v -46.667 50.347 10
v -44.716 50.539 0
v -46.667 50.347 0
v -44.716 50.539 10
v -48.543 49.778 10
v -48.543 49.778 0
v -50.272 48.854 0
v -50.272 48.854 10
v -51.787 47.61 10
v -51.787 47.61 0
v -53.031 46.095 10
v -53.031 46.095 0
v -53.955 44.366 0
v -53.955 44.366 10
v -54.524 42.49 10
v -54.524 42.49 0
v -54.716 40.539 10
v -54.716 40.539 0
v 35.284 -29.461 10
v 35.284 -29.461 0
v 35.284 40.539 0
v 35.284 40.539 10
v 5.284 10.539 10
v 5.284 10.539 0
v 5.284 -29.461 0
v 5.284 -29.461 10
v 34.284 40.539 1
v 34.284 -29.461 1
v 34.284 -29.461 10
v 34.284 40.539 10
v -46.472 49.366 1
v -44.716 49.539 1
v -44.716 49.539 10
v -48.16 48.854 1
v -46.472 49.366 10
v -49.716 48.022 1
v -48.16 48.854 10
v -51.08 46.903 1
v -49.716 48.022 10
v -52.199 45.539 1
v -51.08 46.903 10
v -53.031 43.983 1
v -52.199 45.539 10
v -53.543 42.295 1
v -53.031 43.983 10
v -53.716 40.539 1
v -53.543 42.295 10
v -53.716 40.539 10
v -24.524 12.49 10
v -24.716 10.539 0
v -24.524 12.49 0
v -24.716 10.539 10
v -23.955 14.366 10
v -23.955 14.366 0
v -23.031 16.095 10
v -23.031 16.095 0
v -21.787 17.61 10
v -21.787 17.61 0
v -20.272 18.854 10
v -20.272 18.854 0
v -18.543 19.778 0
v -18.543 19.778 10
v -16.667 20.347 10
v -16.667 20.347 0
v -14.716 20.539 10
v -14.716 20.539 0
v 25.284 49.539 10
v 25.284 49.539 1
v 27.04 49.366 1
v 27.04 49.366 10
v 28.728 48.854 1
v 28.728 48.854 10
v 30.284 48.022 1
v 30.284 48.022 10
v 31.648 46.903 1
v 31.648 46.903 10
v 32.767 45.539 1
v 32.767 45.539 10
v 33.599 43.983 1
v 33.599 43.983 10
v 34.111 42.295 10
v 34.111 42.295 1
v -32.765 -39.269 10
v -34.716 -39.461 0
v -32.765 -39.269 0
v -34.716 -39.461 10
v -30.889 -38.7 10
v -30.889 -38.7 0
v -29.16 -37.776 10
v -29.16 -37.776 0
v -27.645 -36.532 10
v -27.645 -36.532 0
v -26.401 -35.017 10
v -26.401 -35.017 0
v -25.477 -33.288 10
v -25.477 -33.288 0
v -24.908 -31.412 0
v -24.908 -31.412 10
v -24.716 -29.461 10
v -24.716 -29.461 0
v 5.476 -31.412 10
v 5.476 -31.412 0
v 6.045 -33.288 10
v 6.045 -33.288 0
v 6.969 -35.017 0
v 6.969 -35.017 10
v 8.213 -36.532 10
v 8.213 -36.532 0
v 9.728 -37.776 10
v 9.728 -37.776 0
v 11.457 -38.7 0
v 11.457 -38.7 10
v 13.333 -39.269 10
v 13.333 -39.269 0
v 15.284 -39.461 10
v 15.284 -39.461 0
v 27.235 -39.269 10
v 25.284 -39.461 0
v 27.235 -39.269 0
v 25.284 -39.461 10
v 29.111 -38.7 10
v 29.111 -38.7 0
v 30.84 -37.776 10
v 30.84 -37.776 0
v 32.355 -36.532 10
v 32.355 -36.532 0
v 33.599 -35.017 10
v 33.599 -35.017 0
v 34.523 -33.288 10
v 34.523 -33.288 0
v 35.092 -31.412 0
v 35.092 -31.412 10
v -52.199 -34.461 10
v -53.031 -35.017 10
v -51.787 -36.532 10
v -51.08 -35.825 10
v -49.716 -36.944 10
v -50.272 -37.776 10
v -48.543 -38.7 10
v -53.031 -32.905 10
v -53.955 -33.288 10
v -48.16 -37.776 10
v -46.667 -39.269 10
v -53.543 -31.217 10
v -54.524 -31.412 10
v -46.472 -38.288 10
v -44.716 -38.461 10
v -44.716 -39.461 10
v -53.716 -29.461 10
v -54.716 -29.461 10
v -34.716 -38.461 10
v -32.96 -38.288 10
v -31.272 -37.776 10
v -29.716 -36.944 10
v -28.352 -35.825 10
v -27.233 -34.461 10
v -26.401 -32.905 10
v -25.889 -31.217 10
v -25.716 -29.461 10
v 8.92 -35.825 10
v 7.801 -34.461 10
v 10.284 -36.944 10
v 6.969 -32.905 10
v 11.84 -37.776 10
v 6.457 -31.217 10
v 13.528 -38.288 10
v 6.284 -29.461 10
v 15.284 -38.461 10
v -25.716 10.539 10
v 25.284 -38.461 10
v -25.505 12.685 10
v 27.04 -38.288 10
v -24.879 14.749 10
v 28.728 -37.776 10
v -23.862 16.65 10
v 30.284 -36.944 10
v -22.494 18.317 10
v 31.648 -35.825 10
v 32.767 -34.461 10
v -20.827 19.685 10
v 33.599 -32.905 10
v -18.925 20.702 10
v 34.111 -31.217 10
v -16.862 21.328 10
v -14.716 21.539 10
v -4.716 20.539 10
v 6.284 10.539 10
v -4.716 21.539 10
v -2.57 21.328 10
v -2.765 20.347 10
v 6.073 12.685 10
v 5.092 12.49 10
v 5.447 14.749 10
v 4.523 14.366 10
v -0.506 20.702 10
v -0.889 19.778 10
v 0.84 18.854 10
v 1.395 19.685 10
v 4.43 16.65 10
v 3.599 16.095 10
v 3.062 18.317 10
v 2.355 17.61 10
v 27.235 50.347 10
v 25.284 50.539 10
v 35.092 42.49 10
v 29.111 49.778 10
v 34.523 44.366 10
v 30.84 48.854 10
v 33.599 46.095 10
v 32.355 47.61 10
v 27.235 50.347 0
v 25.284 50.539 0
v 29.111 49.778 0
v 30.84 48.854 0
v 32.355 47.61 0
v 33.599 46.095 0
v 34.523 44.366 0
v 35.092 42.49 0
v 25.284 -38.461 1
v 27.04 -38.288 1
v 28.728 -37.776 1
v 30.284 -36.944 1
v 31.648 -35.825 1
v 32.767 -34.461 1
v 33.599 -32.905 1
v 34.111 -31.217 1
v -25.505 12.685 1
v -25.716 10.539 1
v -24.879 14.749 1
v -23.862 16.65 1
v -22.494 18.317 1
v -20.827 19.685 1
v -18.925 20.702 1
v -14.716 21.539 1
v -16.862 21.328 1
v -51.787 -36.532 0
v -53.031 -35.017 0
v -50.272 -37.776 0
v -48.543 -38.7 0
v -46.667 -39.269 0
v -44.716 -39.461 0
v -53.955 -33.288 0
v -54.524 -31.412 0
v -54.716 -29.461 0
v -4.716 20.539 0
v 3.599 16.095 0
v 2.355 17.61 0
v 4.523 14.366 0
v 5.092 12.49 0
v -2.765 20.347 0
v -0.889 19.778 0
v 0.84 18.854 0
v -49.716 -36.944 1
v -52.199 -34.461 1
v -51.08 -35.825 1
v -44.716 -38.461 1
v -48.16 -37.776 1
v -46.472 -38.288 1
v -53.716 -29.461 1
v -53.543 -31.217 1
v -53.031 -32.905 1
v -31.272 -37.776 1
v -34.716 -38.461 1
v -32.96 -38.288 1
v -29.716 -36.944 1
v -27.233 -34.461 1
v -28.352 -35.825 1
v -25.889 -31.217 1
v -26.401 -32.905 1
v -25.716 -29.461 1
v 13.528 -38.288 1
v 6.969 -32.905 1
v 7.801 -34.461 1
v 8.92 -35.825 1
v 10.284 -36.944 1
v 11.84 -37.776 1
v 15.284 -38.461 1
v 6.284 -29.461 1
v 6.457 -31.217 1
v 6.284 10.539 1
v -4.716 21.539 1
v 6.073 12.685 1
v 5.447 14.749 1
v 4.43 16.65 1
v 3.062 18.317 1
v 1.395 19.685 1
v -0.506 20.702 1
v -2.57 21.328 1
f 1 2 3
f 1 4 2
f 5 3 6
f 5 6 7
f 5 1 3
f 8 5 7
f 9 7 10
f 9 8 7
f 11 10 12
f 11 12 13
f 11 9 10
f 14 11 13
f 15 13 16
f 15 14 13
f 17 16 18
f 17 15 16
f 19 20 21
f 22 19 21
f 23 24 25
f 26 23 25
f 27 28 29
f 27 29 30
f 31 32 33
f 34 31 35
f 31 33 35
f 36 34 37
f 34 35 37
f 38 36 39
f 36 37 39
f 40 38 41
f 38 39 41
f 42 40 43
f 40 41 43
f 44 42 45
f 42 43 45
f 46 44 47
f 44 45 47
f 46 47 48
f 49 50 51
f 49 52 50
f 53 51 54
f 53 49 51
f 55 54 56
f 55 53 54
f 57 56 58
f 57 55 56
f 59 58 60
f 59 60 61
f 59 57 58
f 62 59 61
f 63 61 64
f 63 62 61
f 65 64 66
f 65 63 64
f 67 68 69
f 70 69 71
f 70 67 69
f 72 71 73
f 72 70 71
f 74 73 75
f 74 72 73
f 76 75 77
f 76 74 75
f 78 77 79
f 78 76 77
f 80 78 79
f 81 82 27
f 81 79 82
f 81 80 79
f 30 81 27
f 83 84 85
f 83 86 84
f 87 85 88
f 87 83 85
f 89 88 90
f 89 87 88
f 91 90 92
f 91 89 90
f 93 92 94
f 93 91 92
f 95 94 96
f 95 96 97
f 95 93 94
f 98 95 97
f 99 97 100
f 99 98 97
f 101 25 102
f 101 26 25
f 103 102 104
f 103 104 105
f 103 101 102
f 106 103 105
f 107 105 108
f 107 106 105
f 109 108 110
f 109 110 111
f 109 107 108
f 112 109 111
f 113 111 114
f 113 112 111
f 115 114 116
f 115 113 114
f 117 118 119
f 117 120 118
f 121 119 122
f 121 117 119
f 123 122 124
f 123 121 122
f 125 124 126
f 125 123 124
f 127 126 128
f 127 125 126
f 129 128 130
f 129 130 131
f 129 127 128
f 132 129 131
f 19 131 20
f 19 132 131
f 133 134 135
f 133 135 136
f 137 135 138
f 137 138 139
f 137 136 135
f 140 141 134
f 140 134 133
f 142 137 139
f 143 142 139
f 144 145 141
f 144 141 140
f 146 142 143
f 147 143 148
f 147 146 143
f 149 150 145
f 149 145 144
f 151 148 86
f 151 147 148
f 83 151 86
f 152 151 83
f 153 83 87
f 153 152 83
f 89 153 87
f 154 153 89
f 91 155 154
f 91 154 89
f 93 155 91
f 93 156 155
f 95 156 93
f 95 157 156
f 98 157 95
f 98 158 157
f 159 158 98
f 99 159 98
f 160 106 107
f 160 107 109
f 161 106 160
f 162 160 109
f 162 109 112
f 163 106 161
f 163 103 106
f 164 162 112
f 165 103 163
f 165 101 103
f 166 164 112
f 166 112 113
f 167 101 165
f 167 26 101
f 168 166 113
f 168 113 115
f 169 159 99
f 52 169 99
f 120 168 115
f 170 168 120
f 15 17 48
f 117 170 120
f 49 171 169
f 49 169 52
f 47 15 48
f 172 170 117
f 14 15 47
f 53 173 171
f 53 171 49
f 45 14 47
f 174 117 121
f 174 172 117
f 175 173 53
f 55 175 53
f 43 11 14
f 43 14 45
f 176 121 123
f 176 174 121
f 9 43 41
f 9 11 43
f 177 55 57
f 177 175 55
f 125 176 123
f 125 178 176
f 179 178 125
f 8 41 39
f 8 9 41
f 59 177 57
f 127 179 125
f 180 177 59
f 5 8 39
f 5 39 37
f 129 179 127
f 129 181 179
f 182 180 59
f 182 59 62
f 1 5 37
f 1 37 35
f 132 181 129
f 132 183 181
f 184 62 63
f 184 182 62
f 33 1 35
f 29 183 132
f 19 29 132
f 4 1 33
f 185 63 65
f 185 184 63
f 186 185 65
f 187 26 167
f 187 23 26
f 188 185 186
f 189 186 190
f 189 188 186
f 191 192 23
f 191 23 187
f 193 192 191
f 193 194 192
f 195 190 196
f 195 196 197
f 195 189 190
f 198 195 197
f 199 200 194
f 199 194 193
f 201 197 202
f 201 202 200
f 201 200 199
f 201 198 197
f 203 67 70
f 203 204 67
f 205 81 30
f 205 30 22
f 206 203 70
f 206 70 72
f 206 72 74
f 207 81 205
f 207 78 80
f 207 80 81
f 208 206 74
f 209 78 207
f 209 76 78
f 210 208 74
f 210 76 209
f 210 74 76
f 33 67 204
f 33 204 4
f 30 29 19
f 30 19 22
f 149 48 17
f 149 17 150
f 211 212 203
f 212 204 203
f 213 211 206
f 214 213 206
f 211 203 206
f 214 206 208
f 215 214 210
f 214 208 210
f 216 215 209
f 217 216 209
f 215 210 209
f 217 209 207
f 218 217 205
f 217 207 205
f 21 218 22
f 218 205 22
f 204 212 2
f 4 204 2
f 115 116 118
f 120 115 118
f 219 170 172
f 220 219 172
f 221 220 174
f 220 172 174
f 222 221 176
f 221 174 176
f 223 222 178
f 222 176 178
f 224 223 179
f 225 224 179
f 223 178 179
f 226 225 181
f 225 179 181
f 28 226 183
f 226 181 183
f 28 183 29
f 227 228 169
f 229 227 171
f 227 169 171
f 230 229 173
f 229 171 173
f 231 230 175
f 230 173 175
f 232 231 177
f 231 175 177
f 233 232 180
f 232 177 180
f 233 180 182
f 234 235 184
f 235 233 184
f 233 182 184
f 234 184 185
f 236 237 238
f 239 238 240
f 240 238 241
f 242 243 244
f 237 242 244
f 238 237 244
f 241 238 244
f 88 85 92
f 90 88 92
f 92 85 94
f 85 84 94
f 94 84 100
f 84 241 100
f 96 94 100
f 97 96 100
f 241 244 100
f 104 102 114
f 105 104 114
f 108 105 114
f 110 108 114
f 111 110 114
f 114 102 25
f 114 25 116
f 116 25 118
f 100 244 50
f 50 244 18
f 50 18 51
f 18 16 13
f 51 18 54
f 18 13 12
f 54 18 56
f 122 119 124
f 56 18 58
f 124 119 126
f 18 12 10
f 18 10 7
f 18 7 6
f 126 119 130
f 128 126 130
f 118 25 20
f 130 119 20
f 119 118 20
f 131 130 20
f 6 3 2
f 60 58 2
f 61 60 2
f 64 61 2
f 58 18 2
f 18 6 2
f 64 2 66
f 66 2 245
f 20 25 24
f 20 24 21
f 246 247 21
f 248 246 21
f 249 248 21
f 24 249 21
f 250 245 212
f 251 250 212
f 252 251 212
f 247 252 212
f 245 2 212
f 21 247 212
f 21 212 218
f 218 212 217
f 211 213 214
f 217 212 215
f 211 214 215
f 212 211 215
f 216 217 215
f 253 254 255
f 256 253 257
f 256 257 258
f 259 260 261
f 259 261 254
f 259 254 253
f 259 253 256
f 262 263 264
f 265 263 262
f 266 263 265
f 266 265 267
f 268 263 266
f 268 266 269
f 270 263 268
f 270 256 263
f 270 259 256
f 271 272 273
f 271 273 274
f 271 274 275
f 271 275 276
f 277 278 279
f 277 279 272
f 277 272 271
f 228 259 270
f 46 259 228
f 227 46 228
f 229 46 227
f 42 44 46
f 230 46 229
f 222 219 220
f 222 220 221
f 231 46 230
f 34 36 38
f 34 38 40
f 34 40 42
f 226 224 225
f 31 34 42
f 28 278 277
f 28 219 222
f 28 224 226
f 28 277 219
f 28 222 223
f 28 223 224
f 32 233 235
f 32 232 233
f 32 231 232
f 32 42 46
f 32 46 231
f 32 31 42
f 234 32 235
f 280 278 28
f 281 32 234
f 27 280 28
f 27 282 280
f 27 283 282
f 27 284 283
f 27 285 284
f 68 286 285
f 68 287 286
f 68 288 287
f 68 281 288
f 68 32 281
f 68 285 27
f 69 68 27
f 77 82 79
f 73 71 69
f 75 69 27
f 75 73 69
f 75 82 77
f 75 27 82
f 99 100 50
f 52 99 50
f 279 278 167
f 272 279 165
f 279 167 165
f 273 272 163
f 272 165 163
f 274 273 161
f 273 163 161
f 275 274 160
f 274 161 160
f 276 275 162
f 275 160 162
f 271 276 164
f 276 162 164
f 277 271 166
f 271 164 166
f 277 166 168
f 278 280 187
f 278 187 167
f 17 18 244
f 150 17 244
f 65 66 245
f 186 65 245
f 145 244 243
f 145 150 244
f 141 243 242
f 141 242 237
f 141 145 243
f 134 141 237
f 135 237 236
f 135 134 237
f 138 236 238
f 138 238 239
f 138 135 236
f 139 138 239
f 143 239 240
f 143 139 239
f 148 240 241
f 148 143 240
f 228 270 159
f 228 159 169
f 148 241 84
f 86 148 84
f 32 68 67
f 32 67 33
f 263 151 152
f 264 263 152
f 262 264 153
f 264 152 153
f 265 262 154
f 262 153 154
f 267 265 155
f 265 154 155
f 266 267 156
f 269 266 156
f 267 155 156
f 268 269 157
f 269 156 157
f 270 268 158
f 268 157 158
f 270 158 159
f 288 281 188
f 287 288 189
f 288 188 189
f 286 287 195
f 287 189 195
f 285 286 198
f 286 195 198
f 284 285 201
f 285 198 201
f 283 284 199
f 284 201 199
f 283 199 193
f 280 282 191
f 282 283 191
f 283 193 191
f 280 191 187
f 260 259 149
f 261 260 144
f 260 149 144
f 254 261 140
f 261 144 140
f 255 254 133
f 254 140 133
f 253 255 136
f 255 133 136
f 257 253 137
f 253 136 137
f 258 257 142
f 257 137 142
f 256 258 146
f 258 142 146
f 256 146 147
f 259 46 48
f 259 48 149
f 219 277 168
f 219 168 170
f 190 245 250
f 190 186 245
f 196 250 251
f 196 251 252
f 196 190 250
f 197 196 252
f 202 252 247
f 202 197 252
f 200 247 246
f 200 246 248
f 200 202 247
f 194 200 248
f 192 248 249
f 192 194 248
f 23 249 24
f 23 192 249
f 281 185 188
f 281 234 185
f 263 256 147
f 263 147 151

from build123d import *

# Parameters (mm, degrees)
F1_DEPTH = 10
F2_R     = 10
F3_T     = -1


with BuildPart() as f1:
    # F0 (on Top) → F1 (new body)
    with BuildSketch(Plane.XY):
        Polygon((35.284058, 50.538993), (-54.715942, 50.538993), (-54.715942, -39.461007), (-24.715942, -39.461007), (-24.715942, 20.538993), (5.284058, 20.538993), (5.284058, -39.461007), (35.284058, -39.461007), align=None)
    extrude(amount=F1_DEPTH)

    # F2
    f2_edges = [f1.edges().sort_by_distance(p)[0] for p in [
        (35.284058, 50.538993, 5),
        (35.284058, -39.461007, 5),
        (-24.715942, 20.538993, 5),
        (-24.715942, -39.461007, 5),
        (-54.715942, -39.461007, 5),
        (5.284058, -39.461007, 5),
        (5.284058, 20.538993, 5),
        (-54.715942, 50.538993, 5),
    ]]
    fillet(f2_edges, radius=F2_R)

    # F3
    f3_openings = [f1.faces().sort_by_distance(p)[0] for p in [
        (-9.715942, 49.2662, 10),
    ]]
    offset(amount=F3_T, openings=f3_openings)


solid = f1.part
